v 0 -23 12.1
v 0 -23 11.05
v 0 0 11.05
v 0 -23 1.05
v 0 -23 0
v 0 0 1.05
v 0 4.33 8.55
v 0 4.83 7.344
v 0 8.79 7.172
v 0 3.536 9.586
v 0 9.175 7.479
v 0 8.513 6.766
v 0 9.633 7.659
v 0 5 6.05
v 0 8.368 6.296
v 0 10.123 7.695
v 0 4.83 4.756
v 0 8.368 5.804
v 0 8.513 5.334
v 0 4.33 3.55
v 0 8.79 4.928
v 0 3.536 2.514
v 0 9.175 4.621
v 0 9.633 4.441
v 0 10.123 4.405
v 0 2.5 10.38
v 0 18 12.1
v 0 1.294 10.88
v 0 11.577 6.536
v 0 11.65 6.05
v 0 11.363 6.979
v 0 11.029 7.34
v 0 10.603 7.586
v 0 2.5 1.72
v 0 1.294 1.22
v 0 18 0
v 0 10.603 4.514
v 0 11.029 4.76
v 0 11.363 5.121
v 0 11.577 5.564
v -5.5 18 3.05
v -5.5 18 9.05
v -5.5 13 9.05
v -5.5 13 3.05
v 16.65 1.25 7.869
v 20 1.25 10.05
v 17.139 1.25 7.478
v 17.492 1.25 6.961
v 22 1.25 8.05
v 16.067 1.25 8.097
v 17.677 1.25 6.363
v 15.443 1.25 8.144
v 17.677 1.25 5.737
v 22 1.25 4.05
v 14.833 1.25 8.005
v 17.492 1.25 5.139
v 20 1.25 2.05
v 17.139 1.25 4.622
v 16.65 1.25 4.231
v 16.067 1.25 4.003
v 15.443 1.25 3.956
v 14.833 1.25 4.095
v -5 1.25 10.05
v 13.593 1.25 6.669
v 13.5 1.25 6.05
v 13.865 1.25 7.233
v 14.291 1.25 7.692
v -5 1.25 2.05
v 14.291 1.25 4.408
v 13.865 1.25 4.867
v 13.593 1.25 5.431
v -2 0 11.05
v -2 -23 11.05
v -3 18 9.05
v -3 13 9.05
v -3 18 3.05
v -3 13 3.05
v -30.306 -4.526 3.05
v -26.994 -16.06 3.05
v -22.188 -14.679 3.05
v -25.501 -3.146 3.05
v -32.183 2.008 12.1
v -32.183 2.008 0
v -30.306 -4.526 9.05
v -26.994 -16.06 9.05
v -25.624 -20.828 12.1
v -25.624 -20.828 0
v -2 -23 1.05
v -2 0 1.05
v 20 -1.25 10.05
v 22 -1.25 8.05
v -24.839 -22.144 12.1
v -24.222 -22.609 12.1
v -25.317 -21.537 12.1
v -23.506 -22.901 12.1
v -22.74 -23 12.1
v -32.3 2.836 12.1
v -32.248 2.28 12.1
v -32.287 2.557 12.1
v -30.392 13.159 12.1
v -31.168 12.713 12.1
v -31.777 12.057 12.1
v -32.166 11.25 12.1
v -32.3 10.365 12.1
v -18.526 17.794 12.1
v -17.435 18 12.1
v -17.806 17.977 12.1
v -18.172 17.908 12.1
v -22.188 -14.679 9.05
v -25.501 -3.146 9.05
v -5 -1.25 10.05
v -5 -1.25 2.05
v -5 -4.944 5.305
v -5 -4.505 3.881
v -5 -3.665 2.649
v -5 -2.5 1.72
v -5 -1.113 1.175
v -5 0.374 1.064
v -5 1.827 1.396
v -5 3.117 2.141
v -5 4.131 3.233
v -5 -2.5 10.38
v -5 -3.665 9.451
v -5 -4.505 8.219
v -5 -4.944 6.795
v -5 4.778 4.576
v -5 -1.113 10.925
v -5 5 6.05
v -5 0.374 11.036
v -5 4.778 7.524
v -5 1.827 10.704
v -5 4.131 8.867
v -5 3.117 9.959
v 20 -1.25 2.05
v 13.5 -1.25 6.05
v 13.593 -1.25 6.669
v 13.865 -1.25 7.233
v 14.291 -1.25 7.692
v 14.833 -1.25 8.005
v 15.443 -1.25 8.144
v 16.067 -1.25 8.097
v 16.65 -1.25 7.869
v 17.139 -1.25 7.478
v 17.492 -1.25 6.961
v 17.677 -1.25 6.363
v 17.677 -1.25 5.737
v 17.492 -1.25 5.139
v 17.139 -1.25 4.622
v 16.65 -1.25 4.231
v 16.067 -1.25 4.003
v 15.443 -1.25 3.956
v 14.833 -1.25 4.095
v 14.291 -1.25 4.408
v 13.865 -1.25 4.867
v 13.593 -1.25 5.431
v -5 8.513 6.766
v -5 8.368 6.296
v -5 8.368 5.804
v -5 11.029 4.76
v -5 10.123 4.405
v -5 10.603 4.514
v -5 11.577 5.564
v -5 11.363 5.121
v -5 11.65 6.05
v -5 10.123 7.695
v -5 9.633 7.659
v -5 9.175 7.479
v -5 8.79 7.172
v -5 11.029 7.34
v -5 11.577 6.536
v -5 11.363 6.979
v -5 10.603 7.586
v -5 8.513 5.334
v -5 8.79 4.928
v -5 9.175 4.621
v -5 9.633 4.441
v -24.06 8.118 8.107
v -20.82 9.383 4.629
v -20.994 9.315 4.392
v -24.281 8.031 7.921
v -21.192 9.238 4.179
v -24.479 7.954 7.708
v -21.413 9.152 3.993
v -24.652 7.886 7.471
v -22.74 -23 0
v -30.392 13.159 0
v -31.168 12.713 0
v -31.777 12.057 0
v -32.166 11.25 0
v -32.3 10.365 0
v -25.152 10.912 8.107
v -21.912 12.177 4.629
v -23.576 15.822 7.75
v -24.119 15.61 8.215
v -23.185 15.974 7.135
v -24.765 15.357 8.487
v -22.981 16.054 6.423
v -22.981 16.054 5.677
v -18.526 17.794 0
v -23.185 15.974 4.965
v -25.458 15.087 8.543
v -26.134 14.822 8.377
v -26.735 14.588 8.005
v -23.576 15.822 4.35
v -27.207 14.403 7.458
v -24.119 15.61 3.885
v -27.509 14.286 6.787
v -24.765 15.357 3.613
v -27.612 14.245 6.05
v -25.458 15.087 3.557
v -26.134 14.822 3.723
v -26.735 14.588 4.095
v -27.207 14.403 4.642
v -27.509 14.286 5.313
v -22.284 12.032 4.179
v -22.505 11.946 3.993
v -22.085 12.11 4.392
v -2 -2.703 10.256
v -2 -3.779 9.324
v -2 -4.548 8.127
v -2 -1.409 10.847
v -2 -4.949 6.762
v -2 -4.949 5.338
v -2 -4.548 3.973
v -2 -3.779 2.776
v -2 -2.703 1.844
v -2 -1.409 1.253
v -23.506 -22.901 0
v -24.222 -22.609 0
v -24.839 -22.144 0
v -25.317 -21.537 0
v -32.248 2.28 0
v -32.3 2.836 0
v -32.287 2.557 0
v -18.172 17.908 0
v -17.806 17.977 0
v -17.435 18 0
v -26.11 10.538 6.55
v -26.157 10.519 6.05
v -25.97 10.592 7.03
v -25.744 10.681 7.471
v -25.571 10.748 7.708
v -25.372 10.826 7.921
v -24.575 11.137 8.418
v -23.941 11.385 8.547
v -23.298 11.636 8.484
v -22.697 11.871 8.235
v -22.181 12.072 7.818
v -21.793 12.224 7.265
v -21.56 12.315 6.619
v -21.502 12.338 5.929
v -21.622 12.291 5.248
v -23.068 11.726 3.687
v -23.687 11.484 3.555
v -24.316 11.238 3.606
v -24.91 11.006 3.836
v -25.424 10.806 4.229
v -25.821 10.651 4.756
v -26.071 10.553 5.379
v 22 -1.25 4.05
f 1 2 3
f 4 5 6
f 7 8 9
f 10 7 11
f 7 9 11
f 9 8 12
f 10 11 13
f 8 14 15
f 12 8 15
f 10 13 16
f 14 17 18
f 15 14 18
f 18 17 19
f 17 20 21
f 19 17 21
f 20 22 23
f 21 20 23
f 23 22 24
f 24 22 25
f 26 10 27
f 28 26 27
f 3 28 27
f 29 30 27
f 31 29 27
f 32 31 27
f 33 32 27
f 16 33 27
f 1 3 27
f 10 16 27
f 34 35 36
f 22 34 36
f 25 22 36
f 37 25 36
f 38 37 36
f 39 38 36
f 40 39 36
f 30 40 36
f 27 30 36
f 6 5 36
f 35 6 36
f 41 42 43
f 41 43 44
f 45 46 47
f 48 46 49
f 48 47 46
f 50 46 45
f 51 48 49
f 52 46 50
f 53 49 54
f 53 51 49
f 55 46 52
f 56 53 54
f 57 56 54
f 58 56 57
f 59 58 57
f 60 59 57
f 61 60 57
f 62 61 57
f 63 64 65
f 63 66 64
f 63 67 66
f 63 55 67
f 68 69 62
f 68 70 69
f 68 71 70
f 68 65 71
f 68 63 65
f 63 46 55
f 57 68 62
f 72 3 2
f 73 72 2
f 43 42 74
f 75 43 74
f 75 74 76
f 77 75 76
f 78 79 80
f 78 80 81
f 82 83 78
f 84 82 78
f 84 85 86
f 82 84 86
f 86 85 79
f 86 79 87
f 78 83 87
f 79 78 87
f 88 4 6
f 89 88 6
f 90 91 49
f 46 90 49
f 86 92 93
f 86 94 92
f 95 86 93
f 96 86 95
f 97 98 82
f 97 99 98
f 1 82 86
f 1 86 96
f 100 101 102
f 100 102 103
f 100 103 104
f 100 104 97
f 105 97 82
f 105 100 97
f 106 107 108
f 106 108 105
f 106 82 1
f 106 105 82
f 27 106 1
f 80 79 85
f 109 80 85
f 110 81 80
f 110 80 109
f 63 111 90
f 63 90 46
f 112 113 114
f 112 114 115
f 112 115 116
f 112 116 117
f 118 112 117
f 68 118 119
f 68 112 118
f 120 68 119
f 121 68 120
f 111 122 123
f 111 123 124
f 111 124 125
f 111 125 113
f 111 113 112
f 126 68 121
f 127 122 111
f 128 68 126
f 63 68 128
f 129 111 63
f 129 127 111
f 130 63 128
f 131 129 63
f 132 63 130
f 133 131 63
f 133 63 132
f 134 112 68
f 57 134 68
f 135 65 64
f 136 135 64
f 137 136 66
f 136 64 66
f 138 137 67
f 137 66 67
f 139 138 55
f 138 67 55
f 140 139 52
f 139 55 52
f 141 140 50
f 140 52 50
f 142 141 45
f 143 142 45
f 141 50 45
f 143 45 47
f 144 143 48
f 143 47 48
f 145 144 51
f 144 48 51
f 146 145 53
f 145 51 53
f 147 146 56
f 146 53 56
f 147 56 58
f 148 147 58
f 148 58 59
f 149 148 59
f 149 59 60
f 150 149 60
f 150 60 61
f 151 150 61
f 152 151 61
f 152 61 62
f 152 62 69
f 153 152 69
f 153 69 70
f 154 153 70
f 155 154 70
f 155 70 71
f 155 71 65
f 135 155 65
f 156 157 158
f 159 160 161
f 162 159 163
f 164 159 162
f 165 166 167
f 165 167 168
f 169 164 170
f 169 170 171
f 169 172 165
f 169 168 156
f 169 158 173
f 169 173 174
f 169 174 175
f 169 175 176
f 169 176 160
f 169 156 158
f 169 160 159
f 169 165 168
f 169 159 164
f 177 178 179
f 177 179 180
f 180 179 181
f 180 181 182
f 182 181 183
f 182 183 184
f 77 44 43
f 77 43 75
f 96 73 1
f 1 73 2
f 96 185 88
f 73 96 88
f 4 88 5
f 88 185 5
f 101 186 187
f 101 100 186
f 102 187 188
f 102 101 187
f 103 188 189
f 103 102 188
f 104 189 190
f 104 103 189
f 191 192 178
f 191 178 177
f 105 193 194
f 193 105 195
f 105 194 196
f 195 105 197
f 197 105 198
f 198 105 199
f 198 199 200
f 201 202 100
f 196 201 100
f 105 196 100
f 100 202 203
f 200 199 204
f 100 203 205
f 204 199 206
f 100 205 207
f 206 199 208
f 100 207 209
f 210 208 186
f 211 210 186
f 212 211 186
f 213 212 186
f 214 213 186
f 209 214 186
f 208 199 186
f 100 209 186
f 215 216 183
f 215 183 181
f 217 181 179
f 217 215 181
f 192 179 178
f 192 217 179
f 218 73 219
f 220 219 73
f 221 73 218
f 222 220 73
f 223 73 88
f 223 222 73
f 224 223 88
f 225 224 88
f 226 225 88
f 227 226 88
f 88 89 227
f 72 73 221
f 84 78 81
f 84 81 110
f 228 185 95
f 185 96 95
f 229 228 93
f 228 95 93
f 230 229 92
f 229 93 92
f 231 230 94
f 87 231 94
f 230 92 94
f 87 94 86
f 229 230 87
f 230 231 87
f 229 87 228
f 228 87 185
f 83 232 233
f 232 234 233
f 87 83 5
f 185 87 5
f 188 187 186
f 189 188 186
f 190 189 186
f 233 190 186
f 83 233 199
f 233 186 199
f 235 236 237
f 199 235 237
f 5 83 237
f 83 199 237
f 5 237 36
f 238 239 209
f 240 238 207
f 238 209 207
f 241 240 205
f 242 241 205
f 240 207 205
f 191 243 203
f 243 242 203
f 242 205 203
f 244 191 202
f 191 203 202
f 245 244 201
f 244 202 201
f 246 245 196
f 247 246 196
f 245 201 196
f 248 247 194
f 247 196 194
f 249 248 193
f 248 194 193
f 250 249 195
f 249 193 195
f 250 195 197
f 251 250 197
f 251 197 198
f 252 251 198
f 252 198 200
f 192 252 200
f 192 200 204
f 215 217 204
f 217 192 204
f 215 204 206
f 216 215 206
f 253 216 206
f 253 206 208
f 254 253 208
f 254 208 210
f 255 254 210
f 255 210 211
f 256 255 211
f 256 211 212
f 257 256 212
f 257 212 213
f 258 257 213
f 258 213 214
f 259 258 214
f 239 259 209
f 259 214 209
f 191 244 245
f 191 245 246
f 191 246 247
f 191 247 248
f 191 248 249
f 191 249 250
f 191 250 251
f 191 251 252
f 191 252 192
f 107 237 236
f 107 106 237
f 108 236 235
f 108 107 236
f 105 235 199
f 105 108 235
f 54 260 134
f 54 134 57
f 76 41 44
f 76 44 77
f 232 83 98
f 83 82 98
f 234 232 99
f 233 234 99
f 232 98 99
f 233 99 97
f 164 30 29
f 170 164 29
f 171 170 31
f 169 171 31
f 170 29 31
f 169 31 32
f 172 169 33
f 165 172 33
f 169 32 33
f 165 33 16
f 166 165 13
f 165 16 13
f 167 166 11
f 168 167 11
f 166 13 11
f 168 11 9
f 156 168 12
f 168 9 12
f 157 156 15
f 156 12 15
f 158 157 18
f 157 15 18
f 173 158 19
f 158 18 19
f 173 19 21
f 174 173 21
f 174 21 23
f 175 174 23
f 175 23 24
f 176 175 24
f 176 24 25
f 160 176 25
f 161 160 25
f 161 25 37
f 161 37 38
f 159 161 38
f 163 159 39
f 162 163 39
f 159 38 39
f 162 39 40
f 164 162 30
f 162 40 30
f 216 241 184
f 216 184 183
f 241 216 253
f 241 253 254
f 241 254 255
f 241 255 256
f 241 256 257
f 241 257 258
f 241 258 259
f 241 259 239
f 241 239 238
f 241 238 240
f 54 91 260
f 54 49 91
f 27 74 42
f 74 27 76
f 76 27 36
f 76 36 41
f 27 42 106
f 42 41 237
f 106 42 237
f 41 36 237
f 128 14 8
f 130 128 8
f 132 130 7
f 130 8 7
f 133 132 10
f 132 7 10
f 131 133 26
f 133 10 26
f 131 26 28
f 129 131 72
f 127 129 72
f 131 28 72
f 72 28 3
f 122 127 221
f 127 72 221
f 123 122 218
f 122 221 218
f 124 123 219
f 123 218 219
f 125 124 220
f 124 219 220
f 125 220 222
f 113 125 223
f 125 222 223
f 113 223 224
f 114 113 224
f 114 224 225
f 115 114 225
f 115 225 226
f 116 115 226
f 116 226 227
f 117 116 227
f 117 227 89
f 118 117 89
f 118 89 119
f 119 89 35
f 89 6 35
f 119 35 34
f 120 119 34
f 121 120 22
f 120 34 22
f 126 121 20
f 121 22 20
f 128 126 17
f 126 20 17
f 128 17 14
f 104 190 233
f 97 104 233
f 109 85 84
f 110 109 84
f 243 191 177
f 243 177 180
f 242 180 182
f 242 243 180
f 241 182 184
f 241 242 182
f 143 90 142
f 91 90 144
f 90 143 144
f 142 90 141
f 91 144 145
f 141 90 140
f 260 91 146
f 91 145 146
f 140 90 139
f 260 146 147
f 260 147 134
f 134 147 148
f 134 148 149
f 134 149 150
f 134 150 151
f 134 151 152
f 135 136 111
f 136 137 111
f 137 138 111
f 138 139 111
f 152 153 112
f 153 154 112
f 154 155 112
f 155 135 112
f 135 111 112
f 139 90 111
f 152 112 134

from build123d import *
from build123d.topology import SkipClean

# Parameters (mm, degrees)
EXTRUDE_1_DEPTH     = 12.1
SKETCH_2_W          = 2.5
SKETCH_2_H          = 6
CUT_EXTRUDE_1_DEPTH = 5
SKETCH_3_R          = 2.5
CUT_EXTRUDE_2_DEPTH = 4
CUT_EXTRUDE_3_DEPTH = 3
SKETCH_5_W          = 6
SKETCH_5_H          = 12
CUT_EXTRUDE_4_DEPTH = 5
FILLET_1_R          = 3
SKETCH_6_R          = 5
SKETCH_6_R_2        = 1.65
CUT_EXTRUDE_5_DEPTH = 5
SKETCH_7_W          = 8
SKETCH_7_H          = 2.5
EXTRUDE_2_DEPTH     = 27
SKETCH_8_R          = 2.1
CUT_EXTRUDE_6_DEPTH = 30
CHAMFER_1_SIZE      = 2
CUT_EXTRUDE_7_DEPTH = 2


with BuildPart() as part:
    # Эскиз1 → Вытянуть1 (new body)
    with BuildSketch(Plane.XY):
        Polygon((0, -23), (0, 18), (-18, 18), (-32.3, 12.413885007), (-32.3, 2.413885007), (-25, -23), align=None)
    extrude(amount=EXTRUDE_1_DEPTH)

    # Эскиз2 → Вырез-Вытянуть1 (cut)
    with BuildSketch(Plane(origin=(0, 18, 0), x_dir=(1, 0, 0), z_dir=(0, 1, 0))):
        with Locations((-4.25, -6.05)):
            Rectangle(SKETCH_2_W, SKETCH_2_H)
    extrude(amount=-CUT_EXTRUDE_1_DEPTH, mode=Mode.SUBTRACT)

    # Эскиз3 → Вырез-Вытянуть2 (cut)
    with BuildSketch(Plane(origin=(-8.483646071, 21.717443871, 0), x_dir=(0.9314534311844429, 0.3638605578167664, 0), z_dir=(-0.3638605578167664, 0.931453431184443, 0))):
        with Locations(Location((-18.036153415, -6.05, 0), (0, 0, 180))):
            Circle(SKETCH_3_R)
    extrude(amount=-CUT_EXTRUDE_2_DEPTH, mode=Mode.SUBTRACT)

    # Эскиз4 → Вырез-Вытянуть3 (cut)
    with SkipClean():  # the faces are left unmerged after this step: merging them gives an invalid solid
        with BuildSketch(Plane(origin=(-7.028203839, 17.991630147, 0), x_dir=(0.9314534311844429, 0.3638605578167665, 0), z_dir=(-0.36386055781676646, 0.9314534311844428, 0))):
            with BuildLine():
                Line((-20.093115316, -7.470882731), (-16.615270683, -3.993038099))
                ThreePointArc((-16.615270683, -3.993038099), (-16.268386462, -4.282233047), (-15.979191513, -4.629117269))
                Line((-15.979191513, -4.629117269), (-19.457036146, -8.106961901))
                ThreePointArc((-19.457036146, -8.106961901), (-19.803920367, -7.817766953), (-20.093115316, -7.470882731))
            make_face()
        extrude(amount=-CUT_EXTRUDE_3_DEPTH, mode=Mode.SUBTRACT)

    # Эскиз5 → Вырез-Вытянуть4 (cut)
    with SkipClean():  # the faces are left unmerged after this step: merging them gives an invalid solid
        with BuildSketch(Plane(origin=(-29.1975513, -8.386837527, 0), x_dir=(0, 0, 1), z_dir=(-0.9611344752582023, -0.27608064124480053, 0))):
            with Locations((6.05, -1.983302044)):
                Rectangle(SKETCH_5_W, SKETCH_5_H)
        extrude(amount=-CUT_EXTRUDE_4_DEPTH, mode=Mode.SUBTRACT)

    # Скругление1
    fillet_1_edges = [part.edges().sort_by_distance(p)[0] for p in [
        (-32.3, 12.413885007, 6.05),
        (-18, 18, 6.05),
        (-25, -23, 6.05),
        (-32.3, 2.413885007, 6.05),
    ]]
    fillet(fillet_1_edges, radius=FILLET_1_R)

    # Эскиз6 → Вырез-Вытянуть5 (cut)
    with SkipClean():  # the faces are left unmerged after this step: merging them gives an invalid solid
        with BuildSketch(Plane(origin=(0, 0, 0), x_dir=(0, 0, -1), z_dir=(1, 0, 0))):
            with Locations(Location((-6.05, 0, 0), (0, 0, 90))):
                Circle(SKETCH_6_R)
            with Locations(Location((-6.05, 10, 0), (0, 0, 90))):
                Circle(SKETCH_6_R_2)
        extrude(amount=-CUT_EXTRUDE_5_DEPTH, mode=Mode.SUBTRACT)

    # Эскиз7 → Вытянуть2 (add)
    with SkipClean():  # the faces are left unmerged after this step: merging them gives an invalid solid
        with BuildSketch(Plane(origin=(-5, 0, 0), x_dir=(0, 0, -1), z_dir=(1, 0, 0))):
            with Locations((-6.05, 0)):
                Rectangle(SKETCH_7_W, SKETCH_7_H)
        extrude(amount=EXTRUDE_2_DEPTH)

    # Эскиз8 → Вырез-Вытянуть6 (cut)
    with SkipClean():  # the faces are left unmerged after this step: merging them gives an invalid solid
        with BuildSketch(Plane(origin=(0, 1.25, 0), x_dir=(1, 0, 0), z_dir=(0, 1, 0))):
            with Locations(Location((15.6, -6.05, 0), (0, 0, 180))):
                Circle(SKETCH_8_R)
        extrude(amount=-CUT_EXTRUDE_6_DEPTH, mode=Mode.SUBTRACT)

    # Фаска1
    chamfer_1_edges = [part.edges().sort_by_distance(p)[0] for p in [
        (22, 0, 10.05),
        (22, 0, 2.05),
    ]]
    chamfer(chamfer_1_edges, length=CHAMFER_1_SIZE)

    # Эскиз9 → Вырез-Вытянуть7 (cut)
    with SkipClean():  # the faces are left unmerged after this step: merging them gives an invalid solid
        with BuildSketch(Plane(origin=(0, 0, 0), x_dir=(0, 0, -1), z_dir=(1, 0, 0))):
            with BuildLine():
                Line((-11.05, -23), (-1.05, -23))
                Line((-1.05, -23), (-1.05, 0))
                ThreePointArc((-1.05, 0), (-6.05, -5), (-11.05, 0))
                Line((-11.05, 0), (-11.05, -23))
            make_face()
        extrude(amount=-CUT_EXTRUDE_7_DEPTH, mode=Mode.SUBTRACT)


solid = part.part
